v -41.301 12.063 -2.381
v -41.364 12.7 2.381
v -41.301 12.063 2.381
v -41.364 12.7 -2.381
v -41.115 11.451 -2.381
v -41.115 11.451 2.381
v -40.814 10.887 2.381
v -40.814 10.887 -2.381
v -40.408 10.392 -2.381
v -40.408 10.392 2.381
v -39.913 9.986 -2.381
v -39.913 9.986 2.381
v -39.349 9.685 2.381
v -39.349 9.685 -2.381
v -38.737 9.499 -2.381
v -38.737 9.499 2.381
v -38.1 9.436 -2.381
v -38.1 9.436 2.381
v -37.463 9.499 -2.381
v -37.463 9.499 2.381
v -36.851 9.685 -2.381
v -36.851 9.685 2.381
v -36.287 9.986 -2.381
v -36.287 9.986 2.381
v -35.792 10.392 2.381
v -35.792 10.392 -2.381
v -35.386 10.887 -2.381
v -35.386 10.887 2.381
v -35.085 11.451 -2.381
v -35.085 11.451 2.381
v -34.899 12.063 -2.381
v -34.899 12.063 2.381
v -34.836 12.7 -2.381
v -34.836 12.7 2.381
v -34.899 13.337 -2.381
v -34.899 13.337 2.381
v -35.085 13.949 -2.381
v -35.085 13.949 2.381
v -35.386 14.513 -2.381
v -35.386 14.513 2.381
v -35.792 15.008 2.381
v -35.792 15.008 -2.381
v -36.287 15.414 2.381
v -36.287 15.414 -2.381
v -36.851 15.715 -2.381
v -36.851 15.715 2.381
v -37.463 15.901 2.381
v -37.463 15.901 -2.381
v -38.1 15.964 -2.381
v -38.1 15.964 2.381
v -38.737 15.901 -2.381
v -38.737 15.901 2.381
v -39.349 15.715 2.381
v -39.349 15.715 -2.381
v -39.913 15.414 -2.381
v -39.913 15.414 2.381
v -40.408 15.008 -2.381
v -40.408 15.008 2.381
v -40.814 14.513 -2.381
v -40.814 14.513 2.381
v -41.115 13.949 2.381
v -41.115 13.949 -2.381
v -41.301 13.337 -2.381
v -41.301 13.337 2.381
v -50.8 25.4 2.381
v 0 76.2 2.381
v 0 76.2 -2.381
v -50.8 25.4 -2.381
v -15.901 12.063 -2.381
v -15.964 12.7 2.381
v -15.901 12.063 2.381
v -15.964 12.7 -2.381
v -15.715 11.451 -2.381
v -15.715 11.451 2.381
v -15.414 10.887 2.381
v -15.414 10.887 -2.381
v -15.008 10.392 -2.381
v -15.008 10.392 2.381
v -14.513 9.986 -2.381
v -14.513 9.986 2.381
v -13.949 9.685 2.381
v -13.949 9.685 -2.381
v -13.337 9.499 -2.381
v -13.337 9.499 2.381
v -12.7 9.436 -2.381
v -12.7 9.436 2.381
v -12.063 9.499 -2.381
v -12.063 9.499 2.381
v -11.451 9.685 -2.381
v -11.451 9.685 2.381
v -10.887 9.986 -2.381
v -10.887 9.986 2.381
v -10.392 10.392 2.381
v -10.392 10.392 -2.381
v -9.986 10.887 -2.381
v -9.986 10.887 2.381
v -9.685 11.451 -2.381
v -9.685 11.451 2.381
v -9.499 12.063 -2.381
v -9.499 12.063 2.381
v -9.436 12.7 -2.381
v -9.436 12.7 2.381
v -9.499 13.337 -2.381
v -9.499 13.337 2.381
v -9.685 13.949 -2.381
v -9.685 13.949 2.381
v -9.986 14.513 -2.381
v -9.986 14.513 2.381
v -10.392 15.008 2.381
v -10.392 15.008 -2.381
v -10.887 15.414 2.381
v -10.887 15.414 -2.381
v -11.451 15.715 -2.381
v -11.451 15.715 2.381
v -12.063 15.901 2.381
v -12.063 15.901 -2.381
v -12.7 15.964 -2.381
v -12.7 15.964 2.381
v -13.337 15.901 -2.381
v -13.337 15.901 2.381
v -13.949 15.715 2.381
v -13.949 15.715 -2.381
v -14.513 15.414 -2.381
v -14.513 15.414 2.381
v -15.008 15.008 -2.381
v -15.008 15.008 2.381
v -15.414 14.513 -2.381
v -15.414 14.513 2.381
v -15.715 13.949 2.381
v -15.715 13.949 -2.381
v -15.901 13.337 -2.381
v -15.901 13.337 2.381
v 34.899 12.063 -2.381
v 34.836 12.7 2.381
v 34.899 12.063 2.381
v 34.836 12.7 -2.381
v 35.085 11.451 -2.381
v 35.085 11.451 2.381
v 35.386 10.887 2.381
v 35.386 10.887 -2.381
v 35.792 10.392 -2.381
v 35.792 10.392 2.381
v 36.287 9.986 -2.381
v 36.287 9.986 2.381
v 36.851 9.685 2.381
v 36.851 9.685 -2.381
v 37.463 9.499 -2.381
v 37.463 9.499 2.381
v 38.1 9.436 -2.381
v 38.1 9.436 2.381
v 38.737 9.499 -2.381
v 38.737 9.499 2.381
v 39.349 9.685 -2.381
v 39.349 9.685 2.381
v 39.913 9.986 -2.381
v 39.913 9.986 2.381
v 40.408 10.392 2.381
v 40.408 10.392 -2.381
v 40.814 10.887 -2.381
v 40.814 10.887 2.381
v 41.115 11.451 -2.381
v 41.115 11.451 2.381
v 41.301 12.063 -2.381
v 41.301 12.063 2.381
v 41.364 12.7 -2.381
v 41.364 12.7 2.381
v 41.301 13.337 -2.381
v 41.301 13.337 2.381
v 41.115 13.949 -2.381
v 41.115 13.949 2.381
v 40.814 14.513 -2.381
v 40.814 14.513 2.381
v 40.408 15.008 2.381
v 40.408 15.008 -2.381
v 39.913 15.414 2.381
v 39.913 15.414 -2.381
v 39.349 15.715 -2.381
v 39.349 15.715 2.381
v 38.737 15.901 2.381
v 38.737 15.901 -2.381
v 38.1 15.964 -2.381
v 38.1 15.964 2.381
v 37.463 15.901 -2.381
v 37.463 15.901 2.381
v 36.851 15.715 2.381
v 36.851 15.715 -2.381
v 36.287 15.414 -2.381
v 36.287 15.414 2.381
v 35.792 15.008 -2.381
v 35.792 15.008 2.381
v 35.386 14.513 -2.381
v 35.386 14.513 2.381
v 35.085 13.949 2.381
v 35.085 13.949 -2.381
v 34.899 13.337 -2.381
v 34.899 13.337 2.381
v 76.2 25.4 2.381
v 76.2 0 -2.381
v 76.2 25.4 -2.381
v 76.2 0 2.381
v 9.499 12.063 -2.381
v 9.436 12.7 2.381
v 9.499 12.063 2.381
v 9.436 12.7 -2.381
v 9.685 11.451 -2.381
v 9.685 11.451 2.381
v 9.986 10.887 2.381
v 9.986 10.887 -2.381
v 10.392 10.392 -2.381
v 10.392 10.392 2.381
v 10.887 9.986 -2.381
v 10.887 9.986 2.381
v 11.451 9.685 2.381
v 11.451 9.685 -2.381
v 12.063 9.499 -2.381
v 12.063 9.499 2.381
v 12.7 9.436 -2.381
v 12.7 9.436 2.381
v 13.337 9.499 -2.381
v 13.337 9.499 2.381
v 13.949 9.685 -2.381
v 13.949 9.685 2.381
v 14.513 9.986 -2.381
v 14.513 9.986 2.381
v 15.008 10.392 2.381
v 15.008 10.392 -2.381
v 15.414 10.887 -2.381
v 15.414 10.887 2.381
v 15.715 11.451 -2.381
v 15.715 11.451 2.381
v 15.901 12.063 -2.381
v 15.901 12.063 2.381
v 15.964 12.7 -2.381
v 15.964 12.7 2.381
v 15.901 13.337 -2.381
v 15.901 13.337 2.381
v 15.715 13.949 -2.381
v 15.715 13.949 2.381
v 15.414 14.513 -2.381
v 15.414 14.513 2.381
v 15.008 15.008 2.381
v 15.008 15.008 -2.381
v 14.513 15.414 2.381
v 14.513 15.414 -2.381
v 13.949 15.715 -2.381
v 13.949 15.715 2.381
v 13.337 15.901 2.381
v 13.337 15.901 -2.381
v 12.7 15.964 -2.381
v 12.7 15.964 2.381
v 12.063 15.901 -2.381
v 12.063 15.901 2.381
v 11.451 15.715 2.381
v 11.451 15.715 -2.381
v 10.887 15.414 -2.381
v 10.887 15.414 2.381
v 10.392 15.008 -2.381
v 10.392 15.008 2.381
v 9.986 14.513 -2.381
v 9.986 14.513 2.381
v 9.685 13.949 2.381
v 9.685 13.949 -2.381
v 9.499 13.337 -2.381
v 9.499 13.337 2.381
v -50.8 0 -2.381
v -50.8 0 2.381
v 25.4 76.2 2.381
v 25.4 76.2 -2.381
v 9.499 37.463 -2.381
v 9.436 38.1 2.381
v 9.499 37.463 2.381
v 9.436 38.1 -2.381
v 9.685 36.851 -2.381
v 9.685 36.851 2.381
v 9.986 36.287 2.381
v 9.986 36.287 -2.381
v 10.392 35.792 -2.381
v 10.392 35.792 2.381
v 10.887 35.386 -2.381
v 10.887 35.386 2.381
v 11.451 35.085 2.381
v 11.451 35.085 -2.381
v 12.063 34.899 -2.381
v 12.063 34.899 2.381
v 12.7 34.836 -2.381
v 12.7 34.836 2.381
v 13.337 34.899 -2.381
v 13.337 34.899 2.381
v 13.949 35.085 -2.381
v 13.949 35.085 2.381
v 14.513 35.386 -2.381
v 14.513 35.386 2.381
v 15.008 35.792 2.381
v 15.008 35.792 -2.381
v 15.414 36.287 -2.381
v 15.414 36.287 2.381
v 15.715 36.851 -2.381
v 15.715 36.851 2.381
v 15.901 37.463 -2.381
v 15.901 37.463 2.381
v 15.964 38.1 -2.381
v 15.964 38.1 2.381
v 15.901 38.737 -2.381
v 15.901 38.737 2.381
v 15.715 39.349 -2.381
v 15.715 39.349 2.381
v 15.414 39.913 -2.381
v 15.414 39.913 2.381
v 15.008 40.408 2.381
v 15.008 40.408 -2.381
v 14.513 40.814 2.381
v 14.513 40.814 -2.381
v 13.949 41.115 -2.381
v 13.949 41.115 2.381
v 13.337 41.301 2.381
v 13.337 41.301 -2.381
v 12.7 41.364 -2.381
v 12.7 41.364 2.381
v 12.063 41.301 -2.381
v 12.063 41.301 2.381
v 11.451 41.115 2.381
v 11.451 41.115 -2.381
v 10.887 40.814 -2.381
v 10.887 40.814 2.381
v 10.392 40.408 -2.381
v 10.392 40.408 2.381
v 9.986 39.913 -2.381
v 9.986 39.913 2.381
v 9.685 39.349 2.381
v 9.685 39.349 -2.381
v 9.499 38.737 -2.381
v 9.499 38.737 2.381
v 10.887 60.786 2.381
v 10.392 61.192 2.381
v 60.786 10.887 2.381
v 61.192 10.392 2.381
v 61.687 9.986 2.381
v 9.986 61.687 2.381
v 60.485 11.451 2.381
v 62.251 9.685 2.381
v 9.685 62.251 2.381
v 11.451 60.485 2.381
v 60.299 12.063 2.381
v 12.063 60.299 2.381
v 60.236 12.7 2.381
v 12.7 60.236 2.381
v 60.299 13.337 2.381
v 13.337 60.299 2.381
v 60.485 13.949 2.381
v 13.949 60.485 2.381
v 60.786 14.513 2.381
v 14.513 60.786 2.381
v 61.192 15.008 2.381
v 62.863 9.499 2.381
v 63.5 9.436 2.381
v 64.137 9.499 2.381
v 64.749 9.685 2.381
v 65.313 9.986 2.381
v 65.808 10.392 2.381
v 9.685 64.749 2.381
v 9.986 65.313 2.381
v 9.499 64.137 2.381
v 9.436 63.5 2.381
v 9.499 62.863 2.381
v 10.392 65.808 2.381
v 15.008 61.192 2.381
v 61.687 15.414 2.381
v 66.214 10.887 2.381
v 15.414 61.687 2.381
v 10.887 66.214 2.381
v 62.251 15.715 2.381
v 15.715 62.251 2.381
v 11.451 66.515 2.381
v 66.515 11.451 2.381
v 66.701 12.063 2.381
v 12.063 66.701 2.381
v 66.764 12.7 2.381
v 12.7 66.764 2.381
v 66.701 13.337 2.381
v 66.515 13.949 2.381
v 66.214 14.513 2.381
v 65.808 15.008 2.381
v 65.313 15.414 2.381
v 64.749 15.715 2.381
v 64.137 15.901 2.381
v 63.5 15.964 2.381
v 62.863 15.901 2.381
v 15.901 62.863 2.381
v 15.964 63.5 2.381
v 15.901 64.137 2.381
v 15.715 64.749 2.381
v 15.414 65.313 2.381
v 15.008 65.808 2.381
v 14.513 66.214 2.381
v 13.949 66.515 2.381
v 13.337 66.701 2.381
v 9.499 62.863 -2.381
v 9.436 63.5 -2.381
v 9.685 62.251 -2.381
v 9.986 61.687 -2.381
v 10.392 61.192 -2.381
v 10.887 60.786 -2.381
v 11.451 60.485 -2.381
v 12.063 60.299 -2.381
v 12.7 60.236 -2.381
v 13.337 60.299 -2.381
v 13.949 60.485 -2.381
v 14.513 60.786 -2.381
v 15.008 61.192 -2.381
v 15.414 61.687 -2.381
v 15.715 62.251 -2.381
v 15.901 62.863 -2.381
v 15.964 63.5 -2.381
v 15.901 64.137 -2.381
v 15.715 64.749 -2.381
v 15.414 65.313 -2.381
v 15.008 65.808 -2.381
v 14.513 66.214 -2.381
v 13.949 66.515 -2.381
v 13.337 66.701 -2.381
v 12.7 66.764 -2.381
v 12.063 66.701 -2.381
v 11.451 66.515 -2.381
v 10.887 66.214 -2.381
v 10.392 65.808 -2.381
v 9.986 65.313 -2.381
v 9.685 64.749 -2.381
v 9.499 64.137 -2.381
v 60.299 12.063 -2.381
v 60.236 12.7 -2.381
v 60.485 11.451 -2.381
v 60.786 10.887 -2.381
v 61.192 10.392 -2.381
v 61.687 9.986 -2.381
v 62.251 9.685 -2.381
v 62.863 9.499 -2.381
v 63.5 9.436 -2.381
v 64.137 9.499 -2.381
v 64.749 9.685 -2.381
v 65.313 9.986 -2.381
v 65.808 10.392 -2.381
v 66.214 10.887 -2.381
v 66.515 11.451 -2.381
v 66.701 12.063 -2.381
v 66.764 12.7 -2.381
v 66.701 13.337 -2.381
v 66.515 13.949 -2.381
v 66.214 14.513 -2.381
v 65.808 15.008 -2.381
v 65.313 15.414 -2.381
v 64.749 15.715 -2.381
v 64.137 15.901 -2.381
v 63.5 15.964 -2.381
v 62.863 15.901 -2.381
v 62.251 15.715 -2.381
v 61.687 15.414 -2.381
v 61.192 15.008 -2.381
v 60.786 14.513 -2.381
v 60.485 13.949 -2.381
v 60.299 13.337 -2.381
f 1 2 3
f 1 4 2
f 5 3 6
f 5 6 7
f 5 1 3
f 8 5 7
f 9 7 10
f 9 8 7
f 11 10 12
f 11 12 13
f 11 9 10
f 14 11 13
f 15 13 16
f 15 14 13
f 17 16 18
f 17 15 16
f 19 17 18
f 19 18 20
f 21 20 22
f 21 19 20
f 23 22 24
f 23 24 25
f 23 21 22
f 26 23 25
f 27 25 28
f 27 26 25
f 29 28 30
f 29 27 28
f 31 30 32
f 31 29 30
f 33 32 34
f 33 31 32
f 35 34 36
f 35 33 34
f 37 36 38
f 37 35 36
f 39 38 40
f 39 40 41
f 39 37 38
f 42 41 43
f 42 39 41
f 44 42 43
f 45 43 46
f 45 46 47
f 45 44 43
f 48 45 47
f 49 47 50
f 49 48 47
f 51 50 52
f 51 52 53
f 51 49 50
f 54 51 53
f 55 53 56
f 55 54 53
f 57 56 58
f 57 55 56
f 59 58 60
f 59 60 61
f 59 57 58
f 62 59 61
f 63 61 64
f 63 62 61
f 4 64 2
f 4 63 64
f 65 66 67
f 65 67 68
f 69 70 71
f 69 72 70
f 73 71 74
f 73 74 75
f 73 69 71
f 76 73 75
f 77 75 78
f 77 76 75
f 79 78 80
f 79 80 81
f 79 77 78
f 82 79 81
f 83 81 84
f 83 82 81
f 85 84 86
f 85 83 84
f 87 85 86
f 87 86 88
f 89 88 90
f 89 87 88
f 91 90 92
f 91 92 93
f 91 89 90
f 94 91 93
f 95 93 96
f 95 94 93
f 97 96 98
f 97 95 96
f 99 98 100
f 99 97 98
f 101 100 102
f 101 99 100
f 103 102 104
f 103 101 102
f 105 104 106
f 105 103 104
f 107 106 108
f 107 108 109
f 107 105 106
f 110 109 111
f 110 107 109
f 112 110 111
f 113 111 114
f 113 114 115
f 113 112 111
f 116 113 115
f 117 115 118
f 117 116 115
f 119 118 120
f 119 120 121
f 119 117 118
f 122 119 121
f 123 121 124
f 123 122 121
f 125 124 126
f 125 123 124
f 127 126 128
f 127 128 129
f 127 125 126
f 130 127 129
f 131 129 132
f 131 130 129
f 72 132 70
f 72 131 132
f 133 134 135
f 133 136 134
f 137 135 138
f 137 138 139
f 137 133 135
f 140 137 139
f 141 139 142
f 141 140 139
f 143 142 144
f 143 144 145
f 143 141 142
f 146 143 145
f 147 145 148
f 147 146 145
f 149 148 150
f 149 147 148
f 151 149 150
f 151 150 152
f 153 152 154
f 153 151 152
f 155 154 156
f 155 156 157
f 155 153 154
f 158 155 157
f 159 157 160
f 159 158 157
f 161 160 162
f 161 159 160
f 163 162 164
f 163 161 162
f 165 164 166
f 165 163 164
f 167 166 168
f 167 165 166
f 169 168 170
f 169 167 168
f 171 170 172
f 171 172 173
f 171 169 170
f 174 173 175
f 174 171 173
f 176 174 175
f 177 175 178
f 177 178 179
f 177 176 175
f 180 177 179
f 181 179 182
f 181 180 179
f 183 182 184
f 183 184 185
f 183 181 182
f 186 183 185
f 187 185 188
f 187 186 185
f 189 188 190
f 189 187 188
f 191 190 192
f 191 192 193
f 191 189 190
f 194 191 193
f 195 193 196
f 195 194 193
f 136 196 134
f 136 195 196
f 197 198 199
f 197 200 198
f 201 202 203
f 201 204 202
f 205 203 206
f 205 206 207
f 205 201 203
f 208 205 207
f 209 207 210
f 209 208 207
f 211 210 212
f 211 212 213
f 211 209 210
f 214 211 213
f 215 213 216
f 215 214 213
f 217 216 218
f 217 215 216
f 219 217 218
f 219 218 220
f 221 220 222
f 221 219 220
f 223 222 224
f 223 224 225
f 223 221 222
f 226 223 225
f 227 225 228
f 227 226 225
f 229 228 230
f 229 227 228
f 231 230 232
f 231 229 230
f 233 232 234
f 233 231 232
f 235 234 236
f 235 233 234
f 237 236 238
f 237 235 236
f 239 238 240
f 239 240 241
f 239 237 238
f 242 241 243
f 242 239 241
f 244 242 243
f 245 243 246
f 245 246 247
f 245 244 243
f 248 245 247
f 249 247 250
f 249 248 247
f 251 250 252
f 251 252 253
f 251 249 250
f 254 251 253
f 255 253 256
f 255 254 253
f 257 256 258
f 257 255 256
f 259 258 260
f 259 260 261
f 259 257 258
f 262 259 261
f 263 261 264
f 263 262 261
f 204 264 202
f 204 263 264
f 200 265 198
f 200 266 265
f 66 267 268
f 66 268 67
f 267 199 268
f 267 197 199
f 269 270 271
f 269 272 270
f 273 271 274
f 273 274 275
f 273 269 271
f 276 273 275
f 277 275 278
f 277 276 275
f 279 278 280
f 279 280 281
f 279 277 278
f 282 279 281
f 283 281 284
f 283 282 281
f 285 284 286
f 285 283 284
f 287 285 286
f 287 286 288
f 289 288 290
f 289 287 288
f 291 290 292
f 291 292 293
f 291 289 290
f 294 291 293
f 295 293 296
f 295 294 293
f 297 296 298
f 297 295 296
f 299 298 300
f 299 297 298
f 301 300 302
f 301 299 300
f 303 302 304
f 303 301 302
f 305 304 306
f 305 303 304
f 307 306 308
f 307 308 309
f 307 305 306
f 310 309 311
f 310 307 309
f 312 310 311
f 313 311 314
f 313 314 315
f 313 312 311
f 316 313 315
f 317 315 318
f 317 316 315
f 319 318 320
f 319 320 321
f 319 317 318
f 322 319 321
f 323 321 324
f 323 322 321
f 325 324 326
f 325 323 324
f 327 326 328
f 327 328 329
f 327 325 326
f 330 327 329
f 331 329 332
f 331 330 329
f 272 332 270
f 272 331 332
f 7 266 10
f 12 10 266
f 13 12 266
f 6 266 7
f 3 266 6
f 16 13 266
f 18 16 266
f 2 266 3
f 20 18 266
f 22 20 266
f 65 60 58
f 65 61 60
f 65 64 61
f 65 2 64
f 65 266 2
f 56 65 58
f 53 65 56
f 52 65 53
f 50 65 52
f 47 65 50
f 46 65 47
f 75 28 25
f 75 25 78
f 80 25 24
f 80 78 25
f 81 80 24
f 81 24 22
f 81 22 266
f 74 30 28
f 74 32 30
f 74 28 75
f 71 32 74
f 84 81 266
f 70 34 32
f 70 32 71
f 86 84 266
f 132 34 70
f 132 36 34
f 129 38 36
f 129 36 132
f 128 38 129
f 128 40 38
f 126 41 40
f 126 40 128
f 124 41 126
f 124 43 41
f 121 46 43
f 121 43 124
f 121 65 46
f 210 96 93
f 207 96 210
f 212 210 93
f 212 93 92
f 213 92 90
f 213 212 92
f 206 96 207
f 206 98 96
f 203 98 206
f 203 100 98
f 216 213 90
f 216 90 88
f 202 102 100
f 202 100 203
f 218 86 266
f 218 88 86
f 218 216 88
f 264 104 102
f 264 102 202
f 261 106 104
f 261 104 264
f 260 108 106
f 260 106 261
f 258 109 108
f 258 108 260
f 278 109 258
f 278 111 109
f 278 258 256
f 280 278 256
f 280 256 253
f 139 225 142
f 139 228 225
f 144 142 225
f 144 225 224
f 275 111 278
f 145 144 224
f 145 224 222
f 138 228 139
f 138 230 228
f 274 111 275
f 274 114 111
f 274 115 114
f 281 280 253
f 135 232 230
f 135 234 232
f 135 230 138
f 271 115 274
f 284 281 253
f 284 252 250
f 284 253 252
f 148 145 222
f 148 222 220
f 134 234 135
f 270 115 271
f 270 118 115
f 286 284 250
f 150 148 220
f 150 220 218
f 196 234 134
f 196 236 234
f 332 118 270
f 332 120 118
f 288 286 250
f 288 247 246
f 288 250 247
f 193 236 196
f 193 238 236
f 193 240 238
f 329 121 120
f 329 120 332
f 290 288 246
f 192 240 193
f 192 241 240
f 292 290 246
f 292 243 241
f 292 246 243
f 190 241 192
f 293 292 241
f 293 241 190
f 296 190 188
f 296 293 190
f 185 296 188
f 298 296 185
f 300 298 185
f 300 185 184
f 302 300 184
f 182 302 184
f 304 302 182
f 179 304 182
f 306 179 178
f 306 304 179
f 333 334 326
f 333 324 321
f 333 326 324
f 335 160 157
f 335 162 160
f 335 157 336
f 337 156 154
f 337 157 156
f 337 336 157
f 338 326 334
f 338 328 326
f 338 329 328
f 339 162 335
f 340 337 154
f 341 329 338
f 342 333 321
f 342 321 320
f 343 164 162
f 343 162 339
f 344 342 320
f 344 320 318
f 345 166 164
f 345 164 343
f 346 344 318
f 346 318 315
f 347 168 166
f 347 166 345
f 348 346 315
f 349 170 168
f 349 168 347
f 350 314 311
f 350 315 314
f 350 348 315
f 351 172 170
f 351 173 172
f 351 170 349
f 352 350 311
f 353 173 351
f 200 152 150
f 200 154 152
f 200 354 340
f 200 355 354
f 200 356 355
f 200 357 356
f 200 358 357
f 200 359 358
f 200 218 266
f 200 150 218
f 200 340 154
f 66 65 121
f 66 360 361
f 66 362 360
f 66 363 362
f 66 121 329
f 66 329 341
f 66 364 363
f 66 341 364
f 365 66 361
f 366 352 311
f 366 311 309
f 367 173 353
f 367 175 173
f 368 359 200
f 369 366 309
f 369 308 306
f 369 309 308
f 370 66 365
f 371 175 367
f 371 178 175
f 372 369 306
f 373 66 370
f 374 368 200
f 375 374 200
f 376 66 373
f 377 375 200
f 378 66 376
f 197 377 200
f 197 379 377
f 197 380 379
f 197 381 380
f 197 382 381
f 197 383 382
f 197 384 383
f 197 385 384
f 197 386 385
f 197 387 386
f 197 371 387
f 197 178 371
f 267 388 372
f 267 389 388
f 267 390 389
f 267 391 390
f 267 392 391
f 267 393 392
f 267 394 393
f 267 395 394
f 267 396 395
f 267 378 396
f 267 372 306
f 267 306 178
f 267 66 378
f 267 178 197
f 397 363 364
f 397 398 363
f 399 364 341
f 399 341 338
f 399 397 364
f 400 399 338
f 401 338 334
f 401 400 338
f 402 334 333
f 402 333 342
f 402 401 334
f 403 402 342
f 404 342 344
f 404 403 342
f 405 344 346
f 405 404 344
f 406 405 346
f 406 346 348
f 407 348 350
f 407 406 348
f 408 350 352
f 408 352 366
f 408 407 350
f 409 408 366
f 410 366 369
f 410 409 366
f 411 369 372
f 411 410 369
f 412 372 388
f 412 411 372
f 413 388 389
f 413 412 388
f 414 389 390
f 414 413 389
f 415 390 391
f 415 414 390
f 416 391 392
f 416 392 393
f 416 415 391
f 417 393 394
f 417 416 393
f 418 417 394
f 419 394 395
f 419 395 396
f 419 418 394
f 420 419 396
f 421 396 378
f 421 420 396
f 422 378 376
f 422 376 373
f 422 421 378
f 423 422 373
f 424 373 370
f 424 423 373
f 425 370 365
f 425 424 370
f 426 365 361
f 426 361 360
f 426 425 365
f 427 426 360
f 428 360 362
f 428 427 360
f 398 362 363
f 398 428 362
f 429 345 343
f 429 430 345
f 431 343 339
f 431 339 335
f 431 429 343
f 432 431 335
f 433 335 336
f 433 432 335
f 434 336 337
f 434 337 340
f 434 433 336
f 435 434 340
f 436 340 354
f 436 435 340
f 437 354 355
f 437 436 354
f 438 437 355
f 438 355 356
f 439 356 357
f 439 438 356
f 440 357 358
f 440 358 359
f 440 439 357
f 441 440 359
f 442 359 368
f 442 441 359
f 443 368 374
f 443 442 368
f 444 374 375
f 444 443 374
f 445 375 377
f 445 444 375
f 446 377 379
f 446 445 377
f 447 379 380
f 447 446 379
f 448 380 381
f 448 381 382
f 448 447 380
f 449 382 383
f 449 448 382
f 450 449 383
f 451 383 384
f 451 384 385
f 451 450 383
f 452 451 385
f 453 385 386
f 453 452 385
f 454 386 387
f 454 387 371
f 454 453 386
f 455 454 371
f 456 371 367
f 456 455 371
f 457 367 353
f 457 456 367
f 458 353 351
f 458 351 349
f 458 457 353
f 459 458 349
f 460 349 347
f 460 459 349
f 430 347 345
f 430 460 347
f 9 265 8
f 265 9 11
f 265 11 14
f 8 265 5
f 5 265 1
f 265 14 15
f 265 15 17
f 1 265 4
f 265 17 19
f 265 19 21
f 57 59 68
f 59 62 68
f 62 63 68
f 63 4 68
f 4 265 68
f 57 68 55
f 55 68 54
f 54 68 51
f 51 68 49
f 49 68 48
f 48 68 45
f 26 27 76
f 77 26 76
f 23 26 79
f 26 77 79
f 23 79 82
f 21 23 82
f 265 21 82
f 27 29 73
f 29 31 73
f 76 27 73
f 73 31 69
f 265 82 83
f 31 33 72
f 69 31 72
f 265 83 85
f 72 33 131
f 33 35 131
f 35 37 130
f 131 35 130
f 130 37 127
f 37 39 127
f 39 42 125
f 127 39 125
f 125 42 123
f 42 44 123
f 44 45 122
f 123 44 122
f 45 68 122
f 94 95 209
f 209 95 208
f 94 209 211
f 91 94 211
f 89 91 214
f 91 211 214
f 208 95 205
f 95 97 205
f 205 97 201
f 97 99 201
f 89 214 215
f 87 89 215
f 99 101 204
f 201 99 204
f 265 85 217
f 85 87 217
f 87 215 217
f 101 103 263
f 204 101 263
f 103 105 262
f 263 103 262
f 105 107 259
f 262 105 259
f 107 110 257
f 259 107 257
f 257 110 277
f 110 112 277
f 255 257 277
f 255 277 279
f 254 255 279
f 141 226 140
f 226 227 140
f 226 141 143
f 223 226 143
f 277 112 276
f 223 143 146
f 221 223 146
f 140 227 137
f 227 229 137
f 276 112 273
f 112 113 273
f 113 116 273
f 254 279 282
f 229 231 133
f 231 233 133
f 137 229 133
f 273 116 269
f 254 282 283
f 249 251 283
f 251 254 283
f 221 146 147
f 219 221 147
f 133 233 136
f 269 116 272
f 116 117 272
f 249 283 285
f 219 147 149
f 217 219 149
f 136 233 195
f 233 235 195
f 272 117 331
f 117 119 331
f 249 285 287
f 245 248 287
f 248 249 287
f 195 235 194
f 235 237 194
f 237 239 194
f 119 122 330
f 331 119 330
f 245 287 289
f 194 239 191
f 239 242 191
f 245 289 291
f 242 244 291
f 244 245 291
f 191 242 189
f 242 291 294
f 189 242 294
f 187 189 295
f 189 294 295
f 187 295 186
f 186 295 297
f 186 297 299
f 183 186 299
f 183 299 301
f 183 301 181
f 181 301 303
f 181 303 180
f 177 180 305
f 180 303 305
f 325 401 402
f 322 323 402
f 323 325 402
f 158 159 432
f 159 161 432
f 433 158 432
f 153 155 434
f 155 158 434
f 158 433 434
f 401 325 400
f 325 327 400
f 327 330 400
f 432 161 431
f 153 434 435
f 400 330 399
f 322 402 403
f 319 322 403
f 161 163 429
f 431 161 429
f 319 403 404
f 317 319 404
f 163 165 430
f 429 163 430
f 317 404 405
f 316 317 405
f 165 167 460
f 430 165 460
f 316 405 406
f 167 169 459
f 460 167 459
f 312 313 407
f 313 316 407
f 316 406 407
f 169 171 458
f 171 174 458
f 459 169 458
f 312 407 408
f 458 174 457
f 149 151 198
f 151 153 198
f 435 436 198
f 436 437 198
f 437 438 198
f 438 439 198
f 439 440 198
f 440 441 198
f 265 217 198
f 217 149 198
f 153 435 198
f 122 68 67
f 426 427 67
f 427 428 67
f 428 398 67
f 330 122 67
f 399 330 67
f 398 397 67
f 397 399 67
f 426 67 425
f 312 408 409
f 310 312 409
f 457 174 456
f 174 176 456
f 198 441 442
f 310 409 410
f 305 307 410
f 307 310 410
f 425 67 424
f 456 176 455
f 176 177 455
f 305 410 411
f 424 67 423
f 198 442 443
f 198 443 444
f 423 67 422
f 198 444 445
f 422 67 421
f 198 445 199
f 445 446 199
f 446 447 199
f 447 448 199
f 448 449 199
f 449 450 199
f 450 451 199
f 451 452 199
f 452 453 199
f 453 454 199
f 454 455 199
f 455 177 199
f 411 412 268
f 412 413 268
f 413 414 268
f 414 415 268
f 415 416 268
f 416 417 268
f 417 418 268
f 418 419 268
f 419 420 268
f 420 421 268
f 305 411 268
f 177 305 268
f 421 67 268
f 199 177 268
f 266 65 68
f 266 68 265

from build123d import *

# Parameters (mm, degrees)
SKETCH1_R           = 3.2639
BOSS_EXTRUDE1_DEPTH = 2.38125


with BuildPart() as part:
    # Sketch1 → Boss-Extrude1 (new, symmetric)
    with BuildSketch(Plane.XY):
        Polygon((76.2, 25.4), (25.4, 76.2), (0, 76.2), (-50.8, 25.4), (-50.8, 0), (0, 0), (76.2, 0), align=None)
        with Locations(Location((12.7, 12.7, 0), (0, 0, 180))):
            Circle(SKETCH1_R, mode=Mode.SUBTRACT)
        with Locations(Location((38.1, 12.7, 0), (0, 0, 180))):
            Circle(SKETCH1_R, mode=Mode.SUBTRACT)
        with Locations(Location((63.5, 12.7, 0), (0, 0, 180))):
            Circle(SKETCH1_R, mode=Mode.SUBTRACT)
        with Locations(Location((12.7, 38.1, 0), (0, 0, 180))):
            Circle(SKETCH1_R, mode=Mode.SUBTRACT)
        with Locations(Location((12.7, 63.5, 0), (0, 0, 180))):
            Circle(SKETCH1_R, mode=Mode.SUBTRACT)
        with Locations(Location((-38.1, 12.7, 0), (0, 0, 180))):
            Circle(SKETCH1_R, mode=Mode.SUBTRACT)
        with Locations(Location((-12.7, 12.7, 0), (0, 0, 180))):
            Circle(SKETCH1_R, mode=Mode.SUBTRACT)
    extrude(amount=BOSS_EXTRUDE1_DEPTH, both=True)


solid = part.part
